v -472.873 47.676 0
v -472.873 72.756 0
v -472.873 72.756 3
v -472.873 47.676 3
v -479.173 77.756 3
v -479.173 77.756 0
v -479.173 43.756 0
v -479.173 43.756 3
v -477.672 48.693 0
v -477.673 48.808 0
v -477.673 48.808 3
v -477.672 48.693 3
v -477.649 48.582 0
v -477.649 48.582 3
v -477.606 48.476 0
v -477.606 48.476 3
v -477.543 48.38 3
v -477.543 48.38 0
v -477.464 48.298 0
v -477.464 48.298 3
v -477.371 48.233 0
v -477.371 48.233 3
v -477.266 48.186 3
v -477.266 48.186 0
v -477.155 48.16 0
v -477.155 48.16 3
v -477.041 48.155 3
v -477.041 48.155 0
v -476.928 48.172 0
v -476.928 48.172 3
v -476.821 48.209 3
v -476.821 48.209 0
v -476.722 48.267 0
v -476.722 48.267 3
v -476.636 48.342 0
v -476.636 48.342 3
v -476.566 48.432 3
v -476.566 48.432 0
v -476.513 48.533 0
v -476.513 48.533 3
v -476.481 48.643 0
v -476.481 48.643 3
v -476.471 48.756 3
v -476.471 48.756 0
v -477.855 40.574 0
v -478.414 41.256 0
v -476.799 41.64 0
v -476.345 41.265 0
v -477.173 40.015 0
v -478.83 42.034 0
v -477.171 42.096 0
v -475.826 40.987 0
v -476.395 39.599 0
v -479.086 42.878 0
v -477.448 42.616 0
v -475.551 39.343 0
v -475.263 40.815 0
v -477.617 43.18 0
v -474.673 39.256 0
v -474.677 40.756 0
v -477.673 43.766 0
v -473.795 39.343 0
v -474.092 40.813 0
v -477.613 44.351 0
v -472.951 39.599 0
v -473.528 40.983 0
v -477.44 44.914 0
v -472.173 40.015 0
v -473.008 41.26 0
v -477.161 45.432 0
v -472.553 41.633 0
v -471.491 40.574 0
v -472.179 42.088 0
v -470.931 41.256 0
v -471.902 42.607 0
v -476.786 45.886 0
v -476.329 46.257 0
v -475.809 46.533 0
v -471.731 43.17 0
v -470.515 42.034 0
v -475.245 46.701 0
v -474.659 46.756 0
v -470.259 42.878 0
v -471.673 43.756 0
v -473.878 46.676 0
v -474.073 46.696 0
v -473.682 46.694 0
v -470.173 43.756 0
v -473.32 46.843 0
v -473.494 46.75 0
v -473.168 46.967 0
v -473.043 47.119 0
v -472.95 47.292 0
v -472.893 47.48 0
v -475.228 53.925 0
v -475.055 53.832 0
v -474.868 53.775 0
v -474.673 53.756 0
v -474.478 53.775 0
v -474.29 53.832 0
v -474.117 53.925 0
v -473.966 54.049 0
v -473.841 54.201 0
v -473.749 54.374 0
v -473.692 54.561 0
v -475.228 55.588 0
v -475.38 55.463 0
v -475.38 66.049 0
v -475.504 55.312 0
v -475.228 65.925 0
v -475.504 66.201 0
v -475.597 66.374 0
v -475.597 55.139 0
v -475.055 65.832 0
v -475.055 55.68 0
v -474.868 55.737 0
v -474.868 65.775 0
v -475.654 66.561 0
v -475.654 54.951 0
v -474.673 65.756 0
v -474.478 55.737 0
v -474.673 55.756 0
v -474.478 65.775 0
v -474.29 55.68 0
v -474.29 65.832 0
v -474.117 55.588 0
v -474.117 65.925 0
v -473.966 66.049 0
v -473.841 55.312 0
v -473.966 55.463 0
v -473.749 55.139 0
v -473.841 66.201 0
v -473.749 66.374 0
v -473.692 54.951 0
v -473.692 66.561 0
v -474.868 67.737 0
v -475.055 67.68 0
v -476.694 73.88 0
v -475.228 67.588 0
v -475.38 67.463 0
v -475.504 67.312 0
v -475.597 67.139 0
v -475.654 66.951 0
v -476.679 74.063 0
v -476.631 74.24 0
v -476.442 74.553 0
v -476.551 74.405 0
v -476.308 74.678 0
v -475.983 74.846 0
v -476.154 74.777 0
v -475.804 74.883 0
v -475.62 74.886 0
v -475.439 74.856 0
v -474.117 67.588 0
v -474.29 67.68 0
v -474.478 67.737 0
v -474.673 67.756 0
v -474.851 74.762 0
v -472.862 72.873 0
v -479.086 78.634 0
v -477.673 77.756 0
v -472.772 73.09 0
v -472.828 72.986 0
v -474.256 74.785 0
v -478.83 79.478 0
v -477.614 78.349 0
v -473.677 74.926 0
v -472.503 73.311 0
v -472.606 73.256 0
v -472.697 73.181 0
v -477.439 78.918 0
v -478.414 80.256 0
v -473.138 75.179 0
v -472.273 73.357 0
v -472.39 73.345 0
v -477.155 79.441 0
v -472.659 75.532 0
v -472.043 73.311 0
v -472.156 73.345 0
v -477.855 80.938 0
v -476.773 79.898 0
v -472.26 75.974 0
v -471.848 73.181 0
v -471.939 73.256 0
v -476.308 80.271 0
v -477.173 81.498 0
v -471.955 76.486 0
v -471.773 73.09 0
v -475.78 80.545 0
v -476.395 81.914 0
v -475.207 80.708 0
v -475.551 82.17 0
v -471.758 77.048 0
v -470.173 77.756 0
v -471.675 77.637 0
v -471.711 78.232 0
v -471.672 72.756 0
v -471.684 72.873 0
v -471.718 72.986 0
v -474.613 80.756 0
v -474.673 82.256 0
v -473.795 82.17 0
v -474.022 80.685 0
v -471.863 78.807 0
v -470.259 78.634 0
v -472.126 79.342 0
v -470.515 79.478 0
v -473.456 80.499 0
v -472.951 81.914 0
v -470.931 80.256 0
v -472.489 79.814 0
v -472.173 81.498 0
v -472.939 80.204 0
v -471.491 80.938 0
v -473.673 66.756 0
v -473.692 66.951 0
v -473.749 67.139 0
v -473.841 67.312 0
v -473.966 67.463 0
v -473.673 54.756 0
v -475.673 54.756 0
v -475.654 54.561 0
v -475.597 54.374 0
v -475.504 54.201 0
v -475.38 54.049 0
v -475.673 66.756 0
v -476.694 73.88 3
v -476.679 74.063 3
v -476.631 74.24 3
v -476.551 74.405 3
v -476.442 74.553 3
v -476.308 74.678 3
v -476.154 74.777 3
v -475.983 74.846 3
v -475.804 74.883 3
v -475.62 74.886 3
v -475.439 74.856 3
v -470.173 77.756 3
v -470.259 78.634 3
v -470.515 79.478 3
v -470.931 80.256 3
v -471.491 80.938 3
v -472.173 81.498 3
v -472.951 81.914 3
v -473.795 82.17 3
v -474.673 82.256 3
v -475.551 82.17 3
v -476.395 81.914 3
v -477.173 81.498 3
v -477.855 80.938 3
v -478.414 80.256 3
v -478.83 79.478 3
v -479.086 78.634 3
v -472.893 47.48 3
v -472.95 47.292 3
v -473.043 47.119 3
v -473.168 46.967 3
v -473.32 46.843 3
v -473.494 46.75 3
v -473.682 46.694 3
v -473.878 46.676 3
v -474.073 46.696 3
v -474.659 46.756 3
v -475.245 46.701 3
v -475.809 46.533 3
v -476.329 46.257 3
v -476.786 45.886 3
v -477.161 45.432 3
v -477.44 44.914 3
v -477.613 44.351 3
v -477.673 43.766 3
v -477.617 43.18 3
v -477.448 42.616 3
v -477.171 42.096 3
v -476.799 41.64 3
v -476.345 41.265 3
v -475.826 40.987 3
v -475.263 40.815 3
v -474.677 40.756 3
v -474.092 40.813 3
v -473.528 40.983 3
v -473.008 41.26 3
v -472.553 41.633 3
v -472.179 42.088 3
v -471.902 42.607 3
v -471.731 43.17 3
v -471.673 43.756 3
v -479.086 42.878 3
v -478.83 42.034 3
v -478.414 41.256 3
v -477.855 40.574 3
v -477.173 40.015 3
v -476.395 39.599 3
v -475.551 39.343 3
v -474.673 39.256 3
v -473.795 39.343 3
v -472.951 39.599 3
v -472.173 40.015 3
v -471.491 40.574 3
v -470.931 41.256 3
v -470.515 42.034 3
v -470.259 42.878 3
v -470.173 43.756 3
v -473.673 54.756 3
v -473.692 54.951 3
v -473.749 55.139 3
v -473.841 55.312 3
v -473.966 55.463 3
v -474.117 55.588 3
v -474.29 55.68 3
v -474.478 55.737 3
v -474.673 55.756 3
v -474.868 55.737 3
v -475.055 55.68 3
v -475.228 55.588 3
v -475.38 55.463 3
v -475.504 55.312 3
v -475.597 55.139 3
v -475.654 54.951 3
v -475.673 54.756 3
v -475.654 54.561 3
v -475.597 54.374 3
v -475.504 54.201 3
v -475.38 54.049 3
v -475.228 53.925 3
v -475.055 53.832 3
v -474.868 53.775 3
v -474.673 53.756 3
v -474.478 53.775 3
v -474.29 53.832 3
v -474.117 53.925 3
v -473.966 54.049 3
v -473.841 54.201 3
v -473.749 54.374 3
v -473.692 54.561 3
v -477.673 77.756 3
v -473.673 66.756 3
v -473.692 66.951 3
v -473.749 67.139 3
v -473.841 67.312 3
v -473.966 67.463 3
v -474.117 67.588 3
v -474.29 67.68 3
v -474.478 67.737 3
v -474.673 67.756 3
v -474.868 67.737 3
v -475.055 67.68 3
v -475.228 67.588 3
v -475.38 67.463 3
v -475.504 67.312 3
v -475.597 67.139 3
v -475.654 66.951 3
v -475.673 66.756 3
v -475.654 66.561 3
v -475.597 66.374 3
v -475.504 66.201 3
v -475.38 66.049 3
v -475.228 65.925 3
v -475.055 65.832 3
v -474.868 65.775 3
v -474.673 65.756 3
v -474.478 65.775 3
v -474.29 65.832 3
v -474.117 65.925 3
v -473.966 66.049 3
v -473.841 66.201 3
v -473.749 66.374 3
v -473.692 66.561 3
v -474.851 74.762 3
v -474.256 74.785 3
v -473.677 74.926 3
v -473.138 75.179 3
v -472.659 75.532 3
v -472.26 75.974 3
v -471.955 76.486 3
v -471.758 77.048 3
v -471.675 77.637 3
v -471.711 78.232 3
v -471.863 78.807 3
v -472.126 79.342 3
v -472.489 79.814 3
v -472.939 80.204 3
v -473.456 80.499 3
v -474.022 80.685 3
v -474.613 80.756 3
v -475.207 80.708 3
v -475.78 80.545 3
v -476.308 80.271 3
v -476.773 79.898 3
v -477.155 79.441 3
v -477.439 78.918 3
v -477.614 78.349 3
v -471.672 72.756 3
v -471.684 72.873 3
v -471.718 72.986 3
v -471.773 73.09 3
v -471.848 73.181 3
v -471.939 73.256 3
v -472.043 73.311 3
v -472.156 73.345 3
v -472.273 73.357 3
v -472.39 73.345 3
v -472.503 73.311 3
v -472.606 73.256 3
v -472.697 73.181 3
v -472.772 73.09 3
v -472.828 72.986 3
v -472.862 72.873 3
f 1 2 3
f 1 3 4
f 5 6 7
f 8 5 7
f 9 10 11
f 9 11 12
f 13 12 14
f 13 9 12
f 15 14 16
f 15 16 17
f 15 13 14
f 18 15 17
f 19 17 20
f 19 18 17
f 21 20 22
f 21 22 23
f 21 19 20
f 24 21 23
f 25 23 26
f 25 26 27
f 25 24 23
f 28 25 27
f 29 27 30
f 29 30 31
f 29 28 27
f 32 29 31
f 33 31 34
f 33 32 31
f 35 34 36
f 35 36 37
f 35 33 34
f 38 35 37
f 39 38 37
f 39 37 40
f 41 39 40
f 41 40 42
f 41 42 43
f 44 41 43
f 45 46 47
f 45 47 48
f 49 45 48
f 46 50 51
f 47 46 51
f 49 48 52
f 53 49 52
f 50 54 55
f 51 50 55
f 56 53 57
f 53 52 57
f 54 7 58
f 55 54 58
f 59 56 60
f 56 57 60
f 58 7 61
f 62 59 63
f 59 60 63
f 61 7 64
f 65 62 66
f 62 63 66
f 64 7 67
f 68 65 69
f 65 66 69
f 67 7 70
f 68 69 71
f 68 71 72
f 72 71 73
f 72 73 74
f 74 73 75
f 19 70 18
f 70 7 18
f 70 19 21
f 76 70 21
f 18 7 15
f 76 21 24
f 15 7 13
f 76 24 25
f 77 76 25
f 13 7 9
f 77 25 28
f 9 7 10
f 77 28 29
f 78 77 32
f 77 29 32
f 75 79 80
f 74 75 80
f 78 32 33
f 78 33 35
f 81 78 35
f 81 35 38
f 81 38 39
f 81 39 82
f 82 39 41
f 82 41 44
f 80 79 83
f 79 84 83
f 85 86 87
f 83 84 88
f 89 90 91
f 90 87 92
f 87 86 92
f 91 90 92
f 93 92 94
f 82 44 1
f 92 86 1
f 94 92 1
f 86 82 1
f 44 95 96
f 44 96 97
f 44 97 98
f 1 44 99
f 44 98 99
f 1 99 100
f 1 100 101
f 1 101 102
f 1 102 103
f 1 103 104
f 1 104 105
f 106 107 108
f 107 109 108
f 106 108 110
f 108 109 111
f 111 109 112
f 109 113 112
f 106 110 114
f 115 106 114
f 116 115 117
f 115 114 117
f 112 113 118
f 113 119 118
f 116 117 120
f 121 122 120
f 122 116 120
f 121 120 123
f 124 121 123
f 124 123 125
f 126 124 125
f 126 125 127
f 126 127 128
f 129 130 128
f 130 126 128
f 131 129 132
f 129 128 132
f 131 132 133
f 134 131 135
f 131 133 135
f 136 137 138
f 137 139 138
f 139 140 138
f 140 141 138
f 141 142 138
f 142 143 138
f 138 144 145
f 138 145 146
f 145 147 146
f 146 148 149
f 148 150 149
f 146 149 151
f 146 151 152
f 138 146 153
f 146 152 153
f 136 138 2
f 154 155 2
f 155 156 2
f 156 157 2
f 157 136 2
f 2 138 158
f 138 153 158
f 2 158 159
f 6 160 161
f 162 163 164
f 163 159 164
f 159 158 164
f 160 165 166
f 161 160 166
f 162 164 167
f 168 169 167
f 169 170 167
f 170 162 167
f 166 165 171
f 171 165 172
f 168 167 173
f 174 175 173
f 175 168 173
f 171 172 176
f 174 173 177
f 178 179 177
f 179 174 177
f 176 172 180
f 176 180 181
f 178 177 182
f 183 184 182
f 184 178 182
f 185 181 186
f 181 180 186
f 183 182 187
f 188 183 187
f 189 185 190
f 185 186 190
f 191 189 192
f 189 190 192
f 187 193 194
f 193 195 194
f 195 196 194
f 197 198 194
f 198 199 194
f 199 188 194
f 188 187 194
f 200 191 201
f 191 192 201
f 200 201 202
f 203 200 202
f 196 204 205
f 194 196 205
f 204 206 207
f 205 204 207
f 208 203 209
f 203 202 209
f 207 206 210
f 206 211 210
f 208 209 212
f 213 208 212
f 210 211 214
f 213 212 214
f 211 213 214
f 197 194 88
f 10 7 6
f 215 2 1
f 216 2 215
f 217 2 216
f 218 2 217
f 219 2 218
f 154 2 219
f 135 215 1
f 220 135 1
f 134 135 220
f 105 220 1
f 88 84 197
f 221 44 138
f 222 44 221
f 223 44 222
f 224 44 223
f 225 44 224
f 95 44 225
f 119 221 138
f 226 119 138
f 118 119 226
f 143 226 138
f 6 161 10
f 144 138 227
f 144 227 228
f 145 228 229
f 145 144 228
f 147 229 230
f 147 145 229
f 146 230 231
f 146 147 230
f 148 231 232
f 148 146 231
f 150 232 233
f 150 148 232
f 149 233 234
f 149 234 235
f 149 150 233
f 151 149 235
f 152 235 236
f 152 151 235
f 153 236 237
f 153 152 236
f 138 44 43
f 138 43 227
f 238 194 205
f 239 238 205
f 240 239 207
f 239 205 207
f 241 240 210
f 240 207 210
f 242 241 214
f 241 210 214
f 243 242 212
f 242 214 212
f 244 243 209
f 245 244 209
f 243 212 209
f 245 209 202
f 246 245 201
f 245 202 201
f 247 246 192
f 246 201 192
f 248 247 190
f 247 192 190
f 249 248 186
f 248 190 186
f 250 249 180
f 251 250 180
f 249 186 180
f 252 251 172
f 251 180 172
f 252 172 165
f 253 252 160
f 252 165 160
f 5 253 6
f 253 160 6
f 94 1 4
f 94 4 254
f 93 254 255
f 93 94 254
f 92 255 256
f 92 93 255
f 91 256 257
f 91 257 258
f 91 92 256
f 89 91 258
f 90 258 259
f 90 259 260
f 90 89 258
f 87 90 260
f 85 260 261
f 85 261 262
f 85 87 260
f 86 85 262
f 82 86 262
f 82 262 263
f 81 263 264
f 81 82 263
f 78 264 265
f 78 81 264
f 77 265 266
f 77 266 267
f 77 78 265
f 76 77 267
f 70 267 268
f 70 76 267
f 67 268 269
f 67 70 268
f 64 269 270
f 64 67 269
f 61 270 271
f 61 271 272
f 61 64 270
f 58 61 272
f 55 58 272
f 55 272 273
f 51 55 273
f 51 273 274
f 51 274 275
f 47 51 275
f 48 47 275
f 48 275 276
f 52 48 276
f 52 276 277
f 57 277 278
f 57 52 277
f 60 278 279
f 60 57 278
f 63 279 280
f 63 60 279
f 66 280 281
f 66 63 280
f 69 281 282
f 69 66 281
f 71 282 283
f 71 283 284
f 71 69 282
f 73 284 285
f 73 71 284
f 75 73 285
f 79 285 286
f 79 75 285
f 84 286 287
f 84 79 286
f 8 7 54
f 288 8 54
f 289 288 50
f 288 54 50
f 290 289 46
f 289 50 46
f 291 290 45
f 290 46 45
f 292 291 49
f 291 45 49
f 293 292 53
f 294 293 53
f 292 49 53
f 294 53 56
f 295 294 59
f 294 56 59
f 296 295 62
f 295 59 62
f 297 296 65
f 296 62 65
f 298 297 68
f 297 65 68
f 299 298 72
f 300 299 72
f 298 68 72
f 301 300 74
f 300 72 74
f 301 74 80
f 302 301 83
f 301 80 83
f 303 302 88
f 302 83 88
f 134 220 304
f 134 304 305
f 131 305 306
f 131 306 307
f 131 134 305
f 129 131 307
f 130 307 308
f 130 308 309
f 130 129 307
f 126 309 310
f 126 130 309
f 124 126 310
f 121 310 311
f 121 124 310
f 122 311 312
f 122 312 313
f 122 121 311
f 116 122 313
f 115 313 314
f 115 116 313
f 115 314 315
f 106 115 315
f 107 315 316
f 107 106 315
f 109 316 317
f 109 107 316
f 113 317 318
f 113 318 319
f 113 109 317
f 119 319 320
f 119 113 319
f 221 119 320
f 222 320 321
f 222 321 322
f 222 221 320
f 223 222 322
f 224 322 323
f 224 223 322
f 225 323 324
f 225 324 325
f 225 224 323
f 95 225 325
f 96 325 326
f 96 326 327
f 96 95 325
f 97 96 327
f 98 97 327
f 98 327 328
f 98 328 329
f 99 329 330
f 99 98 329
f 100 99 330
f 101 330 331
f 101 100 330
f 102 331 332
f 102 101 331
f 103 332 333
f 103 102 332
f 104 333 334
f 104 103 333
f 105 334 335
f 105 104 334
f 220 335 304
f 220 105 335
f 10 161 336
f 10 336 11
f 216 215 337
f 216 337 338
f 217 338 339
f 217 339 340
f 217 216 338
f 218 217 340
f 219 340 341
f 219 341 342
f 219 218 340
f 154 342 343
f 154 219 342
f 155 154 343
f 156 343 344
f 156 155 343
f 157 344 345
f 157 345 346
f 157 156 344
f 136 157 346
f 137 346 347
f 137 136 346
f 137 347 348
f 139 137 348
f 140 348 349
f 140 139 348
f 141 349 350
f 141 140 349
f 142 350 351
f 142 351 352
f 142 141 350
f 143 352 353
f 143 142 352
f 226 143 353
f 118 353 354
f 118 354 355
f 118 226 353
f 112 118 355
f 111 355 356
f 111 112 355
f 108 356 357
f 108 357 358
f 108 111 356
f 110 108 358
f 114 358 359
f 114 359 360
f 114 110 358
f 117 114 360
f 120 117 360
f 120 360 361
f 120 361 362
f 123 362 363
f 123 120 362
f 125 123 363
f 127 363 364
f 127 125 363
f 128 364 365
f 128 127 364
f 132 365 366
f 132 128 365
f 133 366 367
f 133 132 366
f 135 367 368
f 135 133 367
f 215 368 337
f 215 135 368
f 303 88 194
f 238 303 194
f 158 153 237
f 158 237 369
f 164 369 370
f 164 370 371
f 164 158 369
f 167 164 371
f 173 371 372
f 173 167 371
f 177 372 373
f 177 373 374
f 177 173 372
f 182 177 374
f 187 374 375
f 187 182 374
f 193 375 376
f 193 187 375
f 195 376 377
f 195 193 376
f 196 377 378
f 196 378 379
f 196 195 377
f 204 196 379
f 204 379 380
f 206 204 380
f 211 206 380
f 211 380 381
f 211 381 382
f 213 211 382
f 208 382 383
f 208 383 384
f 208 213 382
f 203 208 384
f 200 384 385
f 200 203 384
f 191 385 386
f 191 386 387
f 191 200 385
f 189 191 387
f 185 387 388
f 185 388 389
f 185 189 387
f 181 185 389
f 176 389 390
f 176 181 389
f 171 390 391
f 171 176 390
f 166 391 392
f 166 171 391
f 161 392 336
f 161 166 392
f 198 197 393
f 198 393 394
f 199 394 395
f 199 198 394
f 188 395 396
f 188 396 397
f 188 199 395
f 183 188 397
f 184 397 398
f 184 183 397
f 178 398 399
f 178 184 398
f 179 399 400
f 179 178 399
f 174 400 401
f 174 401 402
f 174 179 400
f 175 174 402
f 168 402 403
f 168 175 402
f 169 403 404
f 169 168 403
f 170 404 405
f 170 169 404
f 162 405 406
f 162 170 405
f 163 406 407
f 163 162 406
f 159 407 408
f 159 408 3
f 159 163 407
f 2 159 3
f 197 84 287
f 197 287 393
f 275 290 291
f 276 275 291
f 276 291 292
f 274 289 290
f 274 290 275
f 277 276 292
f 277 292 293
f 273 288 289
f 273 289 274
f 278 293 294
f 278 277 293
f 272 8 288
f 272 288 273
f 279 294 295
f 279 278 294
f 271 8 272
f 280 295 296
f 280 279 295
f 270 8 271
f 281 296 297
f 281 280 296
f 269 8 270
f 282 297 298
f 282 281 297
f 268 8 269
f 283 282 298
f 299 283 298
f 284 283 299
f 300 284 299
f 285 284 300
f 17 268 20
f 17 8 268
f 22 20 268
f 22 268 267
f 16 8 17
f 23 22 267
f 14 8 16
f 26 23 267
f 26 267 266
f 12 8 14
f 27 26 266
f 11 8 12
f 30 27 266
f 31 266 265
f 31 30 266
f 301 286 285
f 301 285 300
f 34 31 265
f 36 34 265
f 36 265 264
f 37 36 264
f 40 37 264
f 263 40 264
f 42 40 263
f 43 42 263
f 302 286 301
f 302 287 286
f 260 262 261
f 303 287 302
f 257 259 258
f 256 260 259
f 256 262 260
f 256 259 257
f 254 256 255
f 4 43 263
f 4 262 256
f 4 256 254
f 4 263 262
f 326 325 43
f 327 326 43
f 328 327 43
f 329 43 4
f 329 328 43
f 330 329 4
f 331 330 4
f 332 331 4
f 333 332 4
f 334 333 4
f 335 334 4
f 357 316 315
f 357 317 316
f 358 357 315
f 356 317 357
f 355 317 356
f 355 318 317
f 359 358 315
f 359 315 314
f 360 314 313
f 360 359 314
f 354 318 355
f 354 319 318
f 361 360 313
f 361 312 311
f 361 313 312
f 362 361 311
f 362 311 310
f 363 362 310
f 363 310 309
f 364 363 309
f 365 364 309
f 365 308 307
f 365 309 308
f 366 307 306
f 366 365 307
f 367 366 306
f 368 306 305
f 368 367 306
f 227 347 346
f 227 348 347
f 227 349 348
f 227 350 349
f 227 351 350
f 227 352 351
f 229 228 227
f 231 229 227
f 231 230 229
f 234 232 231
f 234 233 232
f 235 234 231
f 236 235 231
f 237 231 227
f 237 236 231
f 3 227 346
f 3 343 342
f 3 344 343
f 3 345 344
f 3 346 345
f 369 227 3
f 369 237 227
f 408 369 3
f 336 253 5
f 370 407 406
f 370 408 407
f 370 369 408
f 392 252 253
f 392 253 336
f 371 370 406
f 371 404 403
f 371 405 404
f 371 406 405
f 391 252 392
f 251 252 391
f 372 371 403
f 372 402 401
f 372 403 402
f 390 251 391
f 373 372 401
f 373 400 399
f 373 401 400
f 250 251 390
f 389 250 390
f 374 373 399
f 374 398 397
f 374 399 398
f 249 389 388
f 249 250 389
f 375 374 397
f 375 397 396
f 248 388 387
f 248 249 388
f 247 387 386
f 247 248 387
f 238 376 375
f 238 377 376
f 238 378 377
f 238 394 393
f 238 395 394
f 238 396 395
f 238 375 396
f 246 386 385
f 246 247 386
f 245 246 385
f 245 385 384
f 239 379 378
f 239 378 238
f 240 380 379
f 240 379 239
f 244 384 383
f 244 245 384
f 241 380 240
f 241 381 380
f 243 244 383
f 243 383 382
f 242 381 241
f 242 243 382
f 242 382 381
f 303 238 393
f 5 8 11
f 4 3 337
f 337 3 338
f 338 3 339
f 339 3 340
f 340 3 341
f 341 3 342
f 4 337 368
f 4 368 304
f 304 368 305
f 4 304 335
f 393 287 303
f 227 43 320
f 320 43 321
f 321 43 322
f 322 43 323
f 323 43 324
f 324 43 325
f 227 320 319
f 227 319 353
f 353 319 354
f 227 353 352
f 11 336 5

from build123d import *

# Parameters (mm, degrees)
SKETCH_1_R      = 1
EXTRUDE_1_DEPTH = 3


with BuildPart() as part:
    # 草图1 → 凸台-拉伸1 (new body)
    with BuildSketch(Plane.XY):
        with BuildLine():
            Line((-470.172785233, 43.756242), (-470.172785233, 77.756242))
            ThreePointArc((-470.172785233, 77.756242), (-474.672785233, 82.256242), (-479.172785233, 77.756242))
            Line((-479.172785233, 77.756242), (-479.172785233, 43.756242))
            ThreePointArc((-479.172785233, 43.756242), (-474.672785233, 39.256242), (-470.172785233, 43.756242))
        make_face()
        with Locations((-474.672785233, 66.756242)):
            Circle(SKETCH_1_R, mode=Mode.SUBTRACT)
        with Locations((-474.672785233, 54.756242)):
            Circle(SKETCH_1_R, mode=Mode.SUBTRACT)
        with BuildLine():
            Line((-472.873395696, 72.756242), (-472.873395696, 47.675550149))
            ThreePointArc((-472.873395696, 47.675550149), (-473.24087984, 46.901002738), (-474.07324308, 46.695723112))
            ThreePointArc((-474.07324308, 46.695723112), (-476.996427467, 41.858694433), (-471.672785233, 43.756242))
            Line((-471.672785233, 43.756242), (-471.672174771, 72.756229357))
            ThreePointArc((-471.672174771, 72.756229357), (-472.272778912, 73.356852463), (-472.873395696, 72.756242))
        make_face(mode=Mode.SUBTRACT)
        with BuildLine():
            Line((-476.470594729, 48.756242), (-476.694432062, 73.880013915))
            ThreePointArc((-476.694432062, 73.880013915), (-476.308150012, 74.678479143), (-475.439050119, 74.855752709))
            ThreePointArc((-475.439050119, 74.855752709), (-472.295939145, 79.586707151), (-477.672785233, 77.756242))
            Line((-477.672785233, 77.756242), (-477.672785233, 48.807558702))
            ThreePointArc((-477.672785233, 48.807558702), (-477.09846695, 48.154599371), (-476.470594729, 48.756242))
        make_face(mode=Mode.SUBTRACT)
    extrude(amount=EXTRUDE_1_DEPTH)


solid = part.part
